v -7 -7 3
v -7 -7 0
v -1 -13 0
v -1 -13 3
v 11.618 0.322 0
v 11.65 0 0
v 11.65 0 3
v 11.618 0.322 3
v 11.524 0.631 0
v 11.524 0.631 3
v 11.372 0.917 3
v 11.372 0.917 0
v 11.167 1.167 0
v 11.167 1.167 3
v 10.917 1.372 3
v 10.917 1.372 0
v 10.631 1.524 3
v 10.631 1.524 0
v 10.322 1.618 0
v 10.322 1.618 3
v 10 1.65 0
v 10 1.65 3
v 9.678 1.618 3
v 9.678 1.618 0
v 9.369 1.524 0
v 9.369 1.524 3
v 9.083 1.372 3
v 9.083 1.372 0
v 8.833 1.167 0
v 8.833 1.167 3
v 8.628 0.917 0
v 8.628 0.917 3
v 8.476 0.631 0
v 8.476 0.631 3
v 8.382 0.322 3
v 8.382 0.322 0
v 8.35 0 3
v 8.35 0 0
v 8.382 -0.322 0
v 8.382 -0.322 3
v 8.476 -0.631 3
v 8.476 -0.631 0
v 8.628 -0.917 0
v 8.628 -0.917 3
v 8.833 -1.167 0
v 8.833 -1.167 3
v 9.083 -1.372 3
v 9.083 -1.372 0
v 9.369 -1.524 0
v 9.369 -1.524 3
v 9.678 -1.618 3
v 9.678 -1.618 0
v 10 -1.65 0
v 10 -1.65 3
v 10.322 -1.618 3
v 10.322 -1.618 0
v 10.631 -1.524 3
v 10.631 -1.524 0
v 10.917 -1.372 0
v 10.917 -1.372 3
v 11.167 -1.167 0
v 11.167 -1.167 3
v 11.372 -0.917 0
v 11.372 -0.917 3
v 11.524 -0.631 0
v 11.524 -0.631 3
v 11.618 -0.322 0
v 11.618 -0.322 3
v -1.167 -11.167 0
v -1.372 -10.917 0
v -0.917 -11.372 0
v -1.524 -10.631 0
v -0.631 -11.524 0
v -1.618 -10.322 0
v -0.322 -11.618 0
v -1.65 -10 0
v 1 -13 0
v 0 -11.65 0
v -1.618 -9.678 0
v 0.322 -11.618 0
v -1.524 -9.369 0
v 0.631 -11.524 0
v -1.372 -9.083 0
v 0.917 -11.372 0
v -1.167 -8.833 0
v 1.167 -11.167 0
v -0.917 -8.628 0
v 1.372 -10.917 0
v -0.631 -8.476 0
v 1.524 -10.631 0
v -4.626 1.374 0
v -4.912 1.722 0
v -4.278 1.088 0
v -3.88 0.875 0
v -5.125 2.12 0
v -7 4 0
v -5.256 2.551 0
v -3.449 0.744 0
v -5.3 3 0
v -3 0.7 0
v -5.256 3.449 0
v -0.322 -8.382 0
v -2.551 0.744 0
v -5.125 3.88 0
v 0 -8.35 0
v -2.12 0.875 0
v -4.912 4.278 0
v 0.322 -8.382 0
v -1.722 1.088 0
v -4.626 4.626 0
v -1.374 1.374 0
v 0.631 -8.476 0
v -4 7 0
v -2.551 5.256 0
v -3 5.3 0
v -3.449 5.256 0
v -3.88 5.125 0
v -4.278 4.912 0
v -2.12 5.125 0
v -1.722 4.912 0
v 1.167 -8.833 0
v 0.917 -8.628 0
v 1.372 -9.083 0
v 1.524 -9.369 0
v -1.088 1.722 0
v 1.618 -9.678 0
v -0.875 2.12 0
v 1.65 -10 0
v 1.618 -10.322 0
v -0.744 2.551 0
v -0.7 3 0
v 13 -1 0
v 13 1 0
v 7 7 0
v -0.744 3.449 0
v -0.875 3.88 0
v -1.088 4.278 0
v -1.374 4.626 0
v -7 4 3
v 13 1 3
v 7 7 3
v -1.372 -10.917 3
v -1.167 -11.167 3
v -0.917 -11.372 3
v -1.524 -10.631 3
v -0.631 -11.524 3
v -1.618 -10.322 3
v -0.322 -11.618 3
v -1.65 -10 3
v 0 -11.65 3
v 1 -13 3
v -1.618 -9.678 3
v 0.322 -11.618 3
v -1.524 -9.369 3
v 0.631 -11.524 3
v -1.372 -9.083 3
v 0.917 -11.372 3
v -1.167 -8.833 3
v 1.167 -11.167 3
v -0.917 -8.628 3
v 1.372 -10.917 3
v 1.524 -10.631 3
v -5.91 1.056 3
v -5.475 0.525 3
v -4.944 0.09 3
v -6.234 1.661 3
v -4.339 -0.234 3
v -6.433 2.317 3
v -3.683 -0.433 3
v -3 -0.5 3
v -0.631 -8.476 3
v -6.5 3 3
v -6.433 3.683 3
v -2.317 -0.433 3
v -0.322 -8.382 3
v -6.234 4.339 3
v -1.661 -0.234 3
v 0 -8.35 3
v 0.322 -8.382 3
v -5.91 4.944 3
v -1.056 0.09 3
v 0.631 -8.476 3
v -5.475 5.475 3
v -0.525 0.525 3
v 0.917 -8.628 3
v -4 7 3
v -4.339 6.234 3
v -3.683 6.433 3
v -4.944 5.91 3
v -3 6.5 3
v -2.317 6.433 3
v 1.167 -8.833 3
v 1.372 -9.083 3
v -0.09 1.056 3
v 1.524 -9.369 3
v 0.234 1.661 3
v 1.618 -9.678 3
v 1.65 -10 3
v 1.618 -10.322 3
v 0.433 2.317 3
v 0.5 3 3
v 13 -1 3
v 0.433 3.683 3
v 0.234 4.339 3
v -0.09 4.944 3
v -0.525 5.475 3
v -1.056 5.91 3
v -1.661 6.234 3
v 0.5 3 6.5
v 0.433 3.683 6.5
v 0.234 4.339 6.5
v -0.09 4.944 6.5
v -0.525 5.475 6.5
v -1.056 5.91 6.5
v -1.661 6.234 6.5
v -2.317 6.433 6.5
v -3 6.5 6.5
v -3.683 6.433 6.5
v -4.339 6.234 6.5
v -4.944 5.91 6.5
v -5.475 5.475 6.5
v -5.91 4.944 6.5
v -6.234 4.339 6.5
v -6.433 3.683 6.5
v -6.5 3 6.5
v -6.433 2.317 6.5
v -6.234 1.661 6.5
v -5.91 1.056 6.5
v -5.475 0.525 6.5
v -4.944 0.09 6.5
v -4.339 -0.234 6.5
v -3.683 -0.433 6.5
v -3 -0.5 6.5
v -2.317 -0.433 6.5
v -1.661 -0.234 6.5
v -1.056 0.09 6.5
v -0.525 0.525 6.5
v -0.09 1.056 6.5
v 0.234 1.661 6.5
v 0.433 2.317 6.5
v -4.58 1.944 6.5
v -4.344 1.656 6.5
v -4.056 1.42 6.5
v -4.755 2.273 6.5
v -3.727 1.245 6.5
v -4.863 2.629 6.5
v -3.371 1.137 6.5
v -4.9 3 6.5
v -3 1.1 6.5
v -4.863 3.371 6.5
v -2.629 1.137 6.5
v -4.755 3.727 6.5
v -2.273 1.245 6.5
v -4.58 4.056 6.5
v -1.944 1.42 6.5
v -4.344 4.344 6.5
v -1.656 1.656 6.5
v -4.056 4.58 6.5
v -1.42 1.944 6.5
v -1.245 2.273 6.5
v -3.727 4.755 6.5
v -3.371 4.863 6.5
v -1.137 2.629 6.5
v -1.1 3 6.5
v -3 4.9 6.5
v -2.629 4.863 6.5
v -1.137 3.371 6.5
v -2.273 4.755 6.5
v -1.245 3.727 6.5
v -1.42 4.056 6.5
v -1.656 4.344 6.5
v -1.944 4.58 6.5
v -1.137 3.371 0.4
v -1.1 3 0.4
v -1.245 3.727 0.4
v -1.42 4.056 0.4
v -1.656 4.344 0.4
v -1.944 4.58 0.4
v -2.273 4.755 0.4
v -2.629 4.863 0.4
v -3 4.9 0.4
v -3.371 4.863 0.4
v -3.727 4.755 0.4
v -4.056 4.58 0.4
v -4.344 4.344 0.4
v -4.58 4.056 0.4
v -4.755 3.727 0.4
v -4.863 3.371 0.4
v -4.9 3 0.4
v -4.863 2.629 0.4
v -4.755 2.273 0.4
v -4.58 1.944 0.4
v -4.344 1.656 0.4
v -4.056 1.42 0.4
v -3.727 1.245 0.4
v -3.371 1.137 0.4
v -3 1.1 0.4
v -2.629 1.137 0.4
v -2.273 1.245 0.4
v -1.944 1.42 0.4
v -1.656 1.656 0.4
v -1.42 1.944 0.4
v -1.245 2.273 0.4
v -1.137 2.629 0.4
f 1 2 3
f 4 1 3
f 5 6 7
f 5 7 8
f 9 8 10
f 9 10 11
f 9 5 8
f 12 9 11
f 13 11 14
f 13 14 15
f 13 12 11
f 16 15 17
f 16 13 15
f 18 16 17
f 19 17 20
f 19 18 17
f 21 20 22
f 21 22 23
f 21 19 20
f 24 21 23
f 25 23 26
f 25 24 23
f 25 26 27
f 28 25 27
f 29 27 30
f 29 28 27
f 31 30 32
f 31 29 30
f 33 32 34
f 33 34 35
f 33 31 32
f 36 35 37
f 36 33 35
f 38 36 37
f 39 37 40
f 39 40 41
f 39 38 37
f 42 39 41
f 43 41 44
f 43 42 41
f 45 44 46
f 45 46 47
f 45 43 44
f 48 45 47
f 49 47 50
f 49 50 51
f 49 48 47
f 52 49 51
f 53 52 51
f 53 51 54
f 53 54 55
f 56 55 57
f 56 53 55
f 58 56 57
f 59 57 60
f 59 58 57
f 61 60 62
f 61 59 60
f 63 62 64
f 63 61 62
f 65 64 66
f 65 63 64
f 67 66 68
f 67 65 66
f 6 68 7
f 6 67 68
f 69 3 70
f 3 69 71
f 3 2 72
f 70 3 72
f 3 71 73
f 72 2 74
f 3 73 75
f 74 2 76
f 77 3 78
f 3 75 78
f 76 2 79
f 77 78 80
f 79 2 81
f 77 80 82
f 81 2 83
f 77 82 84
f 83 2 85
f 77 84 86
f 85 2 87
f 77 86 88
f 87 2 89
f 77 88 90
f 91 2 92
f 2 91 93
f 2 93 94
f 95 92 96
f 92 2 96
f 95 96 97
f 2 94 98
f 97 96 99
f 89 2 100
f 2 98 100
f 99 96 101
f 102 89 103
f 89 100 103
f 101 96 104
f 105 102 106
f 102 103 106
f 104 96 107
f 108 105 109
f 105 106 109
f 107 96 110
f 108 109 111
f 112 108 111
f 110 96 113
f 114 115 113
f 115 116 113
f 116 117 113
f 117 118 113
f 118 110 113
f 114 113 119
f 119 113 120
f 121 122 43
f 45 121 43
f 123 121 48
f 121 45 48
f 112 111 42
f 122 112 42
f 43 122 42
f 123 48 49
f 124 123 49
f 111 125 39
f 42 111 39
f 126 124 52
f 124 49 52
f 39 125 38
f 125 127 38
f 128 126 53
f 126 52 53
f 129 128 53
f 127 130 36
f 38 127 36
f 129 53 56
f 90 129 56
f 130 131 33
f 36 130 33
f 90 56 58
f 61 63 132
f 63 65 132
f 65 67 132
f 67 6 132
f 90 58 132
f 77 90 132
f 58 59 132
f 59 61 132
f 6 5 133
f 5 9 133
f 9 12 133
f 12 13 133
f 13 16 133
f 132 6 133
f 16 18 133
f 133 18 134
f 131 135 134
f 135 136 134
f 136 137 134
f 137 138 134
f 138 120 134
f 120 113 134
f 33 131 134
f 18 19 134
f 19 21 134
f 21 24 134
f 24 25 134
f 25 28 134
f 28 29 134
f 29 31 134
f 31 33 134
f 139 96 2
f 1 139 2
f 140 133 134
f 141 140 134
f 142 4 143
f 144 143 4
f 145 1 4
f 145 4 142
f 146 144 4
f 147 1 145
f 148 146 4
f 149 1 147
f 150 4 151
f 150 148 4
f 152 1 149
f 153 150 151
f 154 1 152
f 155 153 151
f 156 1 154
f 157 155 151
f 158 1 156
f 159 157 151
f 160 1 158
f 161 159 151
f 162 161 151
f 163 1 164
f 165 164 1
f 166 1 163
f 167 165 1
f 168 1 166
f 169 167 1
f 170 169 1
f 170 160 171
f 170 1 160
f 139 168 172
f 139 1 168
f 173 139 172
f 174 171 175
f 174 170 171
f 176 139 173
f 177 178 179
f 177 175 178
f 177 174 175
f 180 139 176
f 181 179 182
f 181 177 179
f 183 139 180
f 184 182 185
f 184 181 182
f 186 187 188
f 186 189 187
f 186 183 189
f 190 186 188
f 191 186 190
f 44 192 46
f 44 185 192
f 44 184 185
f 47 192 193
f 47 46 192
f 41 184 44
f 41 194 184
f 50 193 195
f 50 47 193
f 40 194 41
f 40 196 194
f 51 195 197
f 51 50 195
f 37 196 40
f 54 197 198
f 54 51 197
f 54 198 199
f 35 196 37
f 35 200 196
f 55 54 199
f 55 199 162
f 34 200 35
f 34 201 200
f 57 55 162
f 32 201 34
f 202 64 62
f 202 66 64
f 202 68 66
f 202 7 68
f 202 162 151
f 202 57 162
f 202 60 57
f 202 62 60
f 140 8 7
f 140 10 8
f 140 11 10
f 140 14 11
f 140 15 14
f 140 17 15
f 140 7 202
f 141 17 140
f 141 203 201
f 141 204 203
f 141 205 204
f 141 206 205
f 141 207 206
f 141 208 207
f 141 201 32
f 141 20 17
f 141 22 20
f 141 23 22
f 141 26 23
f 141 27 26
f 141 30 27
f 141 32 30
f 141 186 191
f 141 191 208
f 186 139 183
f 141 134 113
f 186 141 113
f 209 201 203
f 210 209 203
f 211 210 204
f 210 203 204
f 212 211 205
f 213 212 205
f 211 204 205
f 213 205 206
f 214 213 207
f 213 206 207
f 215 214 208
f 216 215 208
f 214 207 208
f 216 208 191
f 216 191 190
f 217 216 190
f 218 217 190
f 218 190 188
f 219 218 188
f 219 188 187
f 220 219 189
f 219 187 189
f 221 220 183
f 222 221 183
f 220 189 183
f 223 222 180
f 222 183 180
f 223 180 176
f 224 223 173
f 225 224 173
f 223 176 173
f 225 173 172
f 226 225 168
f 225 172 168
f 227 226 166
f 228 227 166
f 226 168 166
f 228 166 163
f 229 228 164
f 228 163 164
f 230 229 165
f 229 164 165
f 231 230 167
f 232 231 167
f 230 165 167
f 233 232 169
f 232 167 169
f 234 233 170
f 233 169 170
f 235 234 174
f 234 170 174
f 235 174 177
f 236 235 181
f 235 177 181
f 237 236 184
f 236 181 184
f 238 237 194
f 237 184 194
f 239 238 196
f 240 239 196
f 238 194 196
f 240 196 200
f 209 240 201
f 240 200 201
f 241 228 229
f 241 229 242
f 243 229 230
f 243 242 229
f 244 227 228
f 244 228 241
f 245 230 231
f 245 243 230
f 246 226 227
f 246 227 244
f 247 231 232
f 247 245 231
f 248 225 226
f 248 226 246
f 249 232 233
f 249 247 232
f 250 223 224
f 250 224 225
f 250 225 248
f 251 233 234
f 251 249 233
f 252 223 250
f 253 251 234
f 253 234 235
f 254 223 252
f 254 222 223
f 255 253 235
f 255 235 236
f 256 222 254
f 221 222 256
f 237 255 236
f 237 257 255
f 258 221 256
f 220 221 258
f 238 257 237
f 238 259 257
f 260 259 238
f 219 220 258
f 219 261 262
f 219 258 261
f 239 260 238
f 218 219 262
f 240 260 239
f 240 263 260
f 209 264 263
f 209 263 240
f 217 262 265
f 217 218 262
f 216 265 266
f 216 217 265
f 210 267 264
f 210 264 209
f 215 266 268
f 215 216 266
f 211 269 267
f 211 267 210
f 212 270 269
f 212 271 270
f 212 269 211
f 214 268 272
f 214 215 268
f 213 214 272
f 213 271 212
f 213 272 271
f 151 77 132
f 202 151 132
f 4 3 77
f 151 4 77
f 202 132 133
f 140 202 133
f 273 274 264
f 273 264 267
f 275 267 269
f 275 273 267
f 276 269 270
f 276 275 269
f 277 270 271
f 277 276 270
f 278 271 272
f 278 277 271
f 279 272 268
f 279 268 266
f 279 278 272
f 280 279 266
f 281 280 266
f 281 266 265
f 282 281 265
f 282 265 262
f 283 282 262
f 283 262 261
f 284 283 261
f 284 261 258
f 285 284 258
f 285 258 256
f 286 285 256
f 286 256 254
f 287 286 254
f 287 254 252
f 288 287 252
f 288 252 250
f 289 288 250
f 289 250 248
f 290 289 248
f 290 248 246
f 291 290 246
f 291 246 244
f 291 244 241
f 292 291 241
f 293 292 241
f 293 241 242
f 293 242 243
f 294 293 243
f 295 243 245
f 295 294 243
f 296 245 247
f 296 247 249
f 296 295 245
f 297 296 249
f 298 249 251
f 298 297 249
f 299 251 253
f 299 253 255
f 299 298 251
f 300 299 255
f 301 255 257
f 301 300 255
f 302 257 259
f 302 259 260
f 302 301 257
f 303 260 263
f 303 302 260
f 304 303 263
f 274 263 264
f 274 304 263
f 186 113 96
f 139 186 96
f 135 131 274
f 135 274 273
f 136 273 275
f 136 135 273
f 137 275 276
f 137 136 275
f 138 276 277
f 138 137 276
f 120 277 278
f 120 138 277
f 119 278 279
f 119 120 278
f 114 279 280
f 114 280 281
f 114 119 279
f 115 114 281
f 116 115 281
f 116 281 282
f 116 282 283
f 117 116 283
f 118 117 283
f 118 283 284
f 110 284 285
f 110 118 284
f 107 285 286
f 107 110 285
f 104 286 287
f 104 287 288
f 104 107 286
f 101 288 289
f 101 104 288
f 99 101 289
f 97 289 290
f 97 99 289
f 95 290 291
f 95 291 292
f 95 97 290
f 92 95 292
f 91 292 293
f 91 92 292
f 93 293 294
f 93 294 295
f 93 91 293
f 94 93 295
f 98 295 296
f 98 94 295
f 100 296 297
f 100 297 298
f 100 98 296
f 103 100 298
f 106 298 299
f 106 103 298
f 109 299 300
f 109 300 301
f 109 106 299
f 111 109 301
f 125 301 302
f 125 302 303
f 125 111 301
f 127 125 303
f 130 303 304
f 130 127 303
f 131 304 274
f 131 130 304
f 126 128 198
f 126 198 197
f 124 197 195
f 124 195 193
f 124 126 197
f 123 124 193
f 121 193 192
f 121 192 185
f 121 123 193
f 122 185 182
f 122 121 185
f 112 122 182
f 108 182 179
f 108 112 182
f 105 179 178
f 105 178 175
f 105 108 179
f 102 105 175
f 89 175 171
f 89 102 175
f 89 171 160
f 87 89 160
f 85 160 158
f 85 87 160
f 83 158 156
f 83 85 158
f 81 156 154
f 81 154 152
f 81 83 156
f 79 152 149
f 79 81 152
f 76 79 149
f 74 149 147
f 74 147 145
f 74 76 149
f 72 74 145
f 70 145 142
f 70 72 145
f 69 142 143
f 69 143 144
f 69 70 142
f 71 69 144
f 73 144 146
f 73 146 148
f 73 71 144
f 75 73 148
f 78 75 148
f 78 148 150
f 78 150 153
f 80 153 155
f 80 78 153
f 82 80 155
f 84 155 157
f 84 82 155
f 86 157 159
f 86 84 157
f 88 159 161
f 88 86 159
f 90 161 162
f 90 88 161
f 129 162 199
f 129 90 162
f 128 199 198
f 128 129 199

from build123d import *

# Parameters (mm, degrees)
SKETCH_R      = 1.65
SKETCH_R_2    = 1.9
PAD_DEPTH     = 3
SKETCH001_R   = 3.5
SKETCH001_R_2 = 1.9
PAD001_DEPTH  = 3.5
CHAMFER_SIZE  = 0.4


with BuildPart() as part:
    # Sketch → Pad (new body)
    with BuildSketch(Plane.XY):
        Polygon((-1, -13), (1, -13), (13, -1), (13, 1), (7, 7), (-4, 7), (-7, 4), (-7, -7), align=None)
        with Locations((0, -10)):
            Circle(SKETCH_R, mode=Mode.SUBTRACT)
        with Locations((10, 0)):
            Circle(SKETCH_R, mode=Mode.SUBTRACT)
        with Locations((-3, 3)):
            Circle(SKETCH_R_2, mode=Mode.SUBTRACT)
    extrude(amount=PAD_DEPTH)

    # Sketch001 (on Face13 of Pad) → Pad001 (join)
    with BuildSketch(Plane.XY.offset(3)):
        with Locations((-3, 3)):
            Circle(SKETCH001_R)
        with Locations((-3, 3)):
            Circle(SKETCH001_R_2, mode=Mode.SUBTRACT)
    extrude(amount=PAD001_DEPTH)

    # Chamfer
    chamfer_edges = [part.edges().sort_by_distance(p)[0] for p in [
        (-4.9, 3, 0),
    ]]
    chamfer(chamfer_edges, length=CHAMFER_SIZE)


solid = part.part
